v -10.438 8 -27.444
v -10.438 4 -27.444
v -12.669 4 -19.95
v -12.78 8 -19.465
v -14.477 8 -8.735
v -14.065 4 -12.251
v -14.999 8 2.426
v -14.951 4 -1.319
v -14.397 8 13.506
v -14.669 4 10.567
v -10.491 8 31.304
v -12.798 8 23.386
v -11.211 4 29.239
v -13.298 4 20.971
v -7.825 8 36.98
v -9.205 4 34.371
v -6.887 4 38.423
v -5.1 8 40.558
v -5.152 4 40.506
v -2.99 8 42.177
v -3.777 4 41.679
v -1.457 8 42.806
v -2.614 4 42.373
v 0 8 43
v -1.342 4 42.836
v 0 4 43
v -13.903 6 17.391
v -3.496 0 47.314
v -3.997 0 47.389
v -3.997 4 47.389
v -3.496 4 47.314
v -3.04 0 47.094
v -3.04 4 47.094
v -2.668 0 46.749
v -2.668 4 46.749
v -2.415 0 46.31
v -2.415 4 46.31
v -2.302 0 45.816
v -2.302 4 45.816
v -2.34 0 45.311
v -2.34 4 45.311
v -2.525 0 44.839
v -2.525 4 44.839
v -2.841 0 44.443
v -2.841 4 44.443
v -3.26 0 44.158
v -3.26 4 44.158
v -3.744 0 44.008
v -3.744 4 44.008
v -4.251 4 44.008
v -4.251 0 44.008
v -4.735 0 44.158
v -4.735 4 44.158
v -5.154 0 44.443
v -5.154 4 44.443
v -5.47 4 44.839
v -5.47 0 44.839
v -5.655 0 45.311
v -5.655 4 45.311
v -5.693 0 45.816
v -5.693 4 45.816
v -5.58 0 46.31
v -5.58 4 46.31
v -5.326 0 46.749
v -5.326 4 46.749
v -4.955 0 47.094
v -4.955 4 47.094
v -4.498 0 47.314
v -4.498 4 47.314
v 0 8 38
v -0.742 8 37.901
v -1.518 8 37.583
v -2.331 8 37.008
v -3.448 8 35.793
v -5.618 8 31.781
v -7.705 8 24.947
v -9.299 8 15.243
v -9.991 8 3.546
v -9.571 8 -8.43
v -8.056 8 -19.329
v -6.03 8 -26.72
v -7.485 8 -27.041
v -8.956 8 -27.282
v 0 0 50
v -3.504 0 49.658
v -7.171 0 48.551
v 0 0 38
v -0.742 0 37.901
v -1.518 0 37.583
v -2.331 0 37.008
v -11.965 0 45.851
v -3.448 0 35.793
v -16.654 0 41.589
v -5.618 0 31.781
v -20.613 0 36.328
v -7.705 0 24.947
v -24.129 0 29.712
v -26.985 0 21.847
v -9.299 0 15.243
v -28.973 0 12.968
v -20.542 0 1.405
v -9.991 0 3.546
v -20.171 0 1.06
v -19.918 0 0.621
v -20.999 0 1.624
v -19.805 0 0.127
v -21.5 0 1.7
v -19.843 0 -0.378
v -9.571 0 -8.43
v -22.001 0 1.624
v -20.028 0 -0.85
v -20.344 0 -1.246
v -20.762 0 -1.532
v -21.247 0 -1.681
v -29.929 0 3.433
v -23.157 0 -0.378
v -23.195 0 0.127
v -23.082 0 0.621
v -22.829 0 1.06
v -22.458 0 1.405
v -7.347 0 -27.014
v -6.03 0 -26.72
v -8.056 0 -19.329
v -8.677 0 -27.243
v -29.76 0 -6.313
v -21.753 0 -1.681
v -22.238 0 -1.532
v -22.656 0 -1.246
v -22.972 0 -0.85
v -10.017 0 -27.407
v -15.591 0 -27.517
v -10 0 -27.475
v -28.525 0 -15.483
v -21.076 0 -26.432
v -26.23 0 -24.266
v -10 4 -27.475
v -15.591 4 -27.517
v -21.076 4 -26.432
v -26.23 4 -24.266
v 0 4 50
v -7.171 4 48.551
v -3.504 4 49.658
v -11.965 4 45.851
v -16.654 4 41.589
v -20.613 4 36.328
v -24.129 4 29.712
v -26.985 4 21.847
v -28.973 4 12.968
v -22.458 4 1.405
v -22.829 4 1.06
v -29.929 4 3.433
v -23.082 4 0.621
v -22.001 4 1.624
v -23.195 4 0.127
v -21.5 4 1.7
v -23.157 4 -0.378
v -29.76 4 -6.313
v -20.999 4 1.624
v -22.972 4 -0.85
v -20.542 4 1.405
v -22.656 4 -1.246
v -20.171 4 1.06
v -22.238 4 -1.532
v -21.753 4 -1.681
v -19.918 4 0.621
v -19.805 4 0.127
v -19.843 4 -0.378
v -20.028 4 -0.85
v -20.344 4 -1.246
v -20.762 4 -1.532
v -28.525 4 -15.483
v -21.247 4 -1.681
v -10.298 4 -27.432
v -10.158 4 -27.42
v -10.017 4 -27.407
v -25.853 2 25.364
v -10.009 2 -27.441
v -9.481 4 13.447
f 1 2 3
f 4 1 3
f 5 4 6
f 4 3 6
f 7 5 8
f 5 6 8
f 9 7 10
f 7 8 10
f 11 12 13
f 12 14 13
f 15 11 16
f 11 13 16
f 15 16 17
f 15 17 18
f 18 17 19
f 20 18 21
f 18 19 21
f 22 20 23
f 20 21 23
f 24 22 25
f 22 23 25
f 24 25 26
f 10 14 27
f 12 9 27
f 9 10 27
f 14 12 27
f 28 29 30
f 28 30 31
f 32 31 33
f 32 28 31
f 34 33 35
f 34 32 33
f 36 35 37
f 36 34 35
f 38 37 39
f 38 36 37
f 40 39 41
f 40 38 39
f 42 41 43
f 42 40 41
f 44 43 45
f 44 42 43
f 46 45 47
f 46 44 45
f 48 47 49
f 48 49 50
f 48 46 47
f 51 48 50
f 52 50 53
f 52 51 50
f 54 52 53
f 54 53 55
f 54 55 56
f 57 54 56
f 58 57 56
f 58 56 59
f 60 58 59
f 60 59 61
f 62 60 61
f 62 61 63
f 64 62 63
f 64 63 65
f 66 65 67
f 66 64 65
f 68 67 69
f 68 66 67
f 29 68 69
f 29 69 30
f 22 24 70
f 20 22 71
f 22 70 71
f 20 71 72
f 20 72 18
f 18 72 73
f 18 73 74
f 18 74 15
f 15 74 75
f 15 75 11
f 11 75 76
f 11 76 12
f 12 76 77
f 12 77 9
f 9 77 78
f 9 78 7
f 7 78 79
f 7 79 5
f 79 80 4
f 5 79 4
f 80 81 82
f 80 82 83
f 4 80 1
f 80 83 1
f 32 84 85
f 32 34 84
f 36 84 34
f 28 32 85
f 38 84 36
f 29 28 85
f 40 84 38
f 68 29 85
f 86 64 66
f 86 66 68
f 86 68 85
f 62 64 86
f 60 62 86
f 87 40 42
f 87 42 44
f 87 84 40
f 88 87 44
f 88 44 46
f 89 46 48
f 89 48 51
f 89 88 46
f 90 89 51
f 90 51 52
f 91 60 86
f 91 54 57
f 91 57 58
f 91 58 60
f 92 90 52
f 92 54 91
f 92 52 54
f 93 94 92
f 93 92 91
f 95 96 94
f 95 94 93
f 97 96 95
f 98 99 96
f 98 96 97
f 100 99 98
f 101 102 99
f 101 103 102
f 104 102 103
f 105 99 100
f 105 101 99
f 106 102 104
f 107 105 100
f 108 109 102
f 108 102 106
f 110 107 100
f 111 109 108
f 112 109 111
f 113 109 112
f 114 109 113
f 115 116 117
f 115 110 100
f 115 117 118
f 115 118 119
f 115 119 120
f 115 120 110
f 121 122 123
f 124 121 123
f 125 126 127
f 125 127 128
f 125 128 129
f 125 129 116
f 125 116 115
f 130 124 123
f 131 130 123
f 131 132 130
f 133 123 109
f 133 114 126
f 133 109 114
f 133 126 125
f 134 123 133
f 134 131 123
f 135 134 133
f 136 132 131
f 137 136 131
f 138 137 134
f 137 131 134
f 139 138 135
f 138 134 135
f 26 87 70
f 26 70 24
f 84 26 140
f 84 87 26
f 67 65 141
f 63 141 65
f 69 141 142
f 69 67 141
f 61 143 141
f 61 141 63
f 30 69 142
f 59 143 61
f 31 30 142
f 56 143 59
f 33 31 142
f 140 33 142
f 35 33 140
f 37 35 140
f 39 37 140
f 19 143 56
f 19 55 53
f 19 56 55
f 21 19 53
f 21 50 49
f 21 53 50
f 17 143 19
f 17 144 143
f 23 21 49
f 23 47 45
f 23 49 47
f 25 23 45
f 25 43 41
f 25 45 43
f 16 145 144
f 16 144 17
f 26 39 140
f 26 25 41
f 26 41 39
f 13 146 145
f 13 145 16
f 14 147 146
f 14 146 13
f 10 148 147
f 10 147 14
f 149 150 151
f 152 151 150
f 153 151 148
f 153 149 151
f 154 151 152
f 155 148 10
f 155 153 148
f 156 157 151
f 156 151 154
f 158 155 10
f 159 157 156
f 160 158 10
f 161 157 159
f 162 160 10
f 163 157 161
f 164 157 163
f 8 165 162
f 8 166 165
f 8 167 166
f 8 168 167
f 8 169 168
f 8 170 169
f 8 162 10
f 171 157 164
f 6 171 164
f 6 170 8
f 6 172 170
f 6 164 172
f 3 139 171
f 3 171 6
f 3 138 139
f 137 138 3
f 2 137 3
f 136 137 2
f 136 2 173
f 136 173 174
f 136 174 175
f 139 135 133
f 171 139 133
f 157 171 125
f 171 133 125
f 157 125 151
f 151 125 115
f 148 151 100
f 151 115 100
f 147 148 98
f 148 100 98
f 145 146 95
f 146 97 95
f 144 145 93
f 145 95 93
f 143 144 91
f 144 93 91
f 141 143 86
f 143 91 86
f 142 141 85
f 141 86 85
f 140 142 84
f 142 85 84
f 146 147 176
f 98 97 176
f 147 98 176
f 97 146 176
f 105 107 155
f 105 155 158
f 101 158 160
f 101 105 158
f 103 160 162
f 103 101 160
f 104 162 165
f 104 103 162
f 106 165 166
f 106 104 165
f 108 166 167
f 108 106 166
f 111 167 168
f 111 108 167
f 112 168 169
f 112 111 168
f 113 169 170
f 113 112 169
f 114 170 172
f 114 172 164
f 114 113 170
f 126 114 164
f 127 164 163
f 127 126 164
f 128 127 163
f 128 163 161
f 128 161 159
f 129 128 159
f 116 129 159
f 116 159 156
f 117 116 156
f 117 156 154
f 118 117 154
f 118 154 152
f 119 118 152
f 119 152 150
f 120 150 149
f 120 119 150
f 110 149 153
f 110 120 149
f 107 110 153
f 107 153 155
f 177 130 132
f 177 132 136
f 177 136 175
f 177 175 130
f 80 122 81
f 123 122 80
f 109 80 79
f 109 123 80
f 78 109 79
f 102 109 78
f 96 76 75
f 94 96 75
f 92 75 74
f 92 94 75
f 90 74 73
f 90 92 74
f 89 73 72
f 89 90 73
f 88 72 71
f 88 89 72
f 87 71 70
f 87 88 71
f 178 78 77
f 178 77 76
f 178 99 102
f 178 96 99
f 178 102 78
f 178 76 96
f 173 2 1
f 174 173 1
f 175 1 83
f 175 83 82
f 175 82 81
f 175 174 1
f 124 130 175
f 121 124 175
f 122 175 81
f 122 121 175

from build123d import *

# Parameters (mm, degrees)
SKETCH_1_R           = 1.7
EXTRUDE_1_DEPTH      = 4
EXTRUDE_2_DEPTH      = 4
EXTRUDE_2_DEPTH_BACK = 4


with BuildPart() as part:
    # Эскиз1 → Бобышка-Вытянуть1 (new body)
    with BuildSketch(Plane(origin=(0, 0, 0), x_dir=(1, 0, 0), z_dir=(0, 1, 0))):
        with BuildLine():
            Line((0, -50), (0, -43))
            add(Edge.make_bspline(
                [(-10.000145873, 27.475174978), (-27.697978685, -43), (0, -43)],
                knots=[4.019246634, 4.019246634, 4.019246634, 6.283185307, 6.283185307, 6.283185307], degree=2, weights=[1, 0.42487789, 1]))
            ThreePointArc((-10.000145873, 27.475174978), (-18.360814479, 27.113576543), (-26.230013338, 24.266254592))
            add(Edge.make_bspline(
                [(-26.230013338, 24.266254592), (-50.964235719, -50), (0, -50)],
                knots=[4.205654034, 4.205654034, 4.205654034, 6.283185307, 6.283185307, 6.283185307], degree=2, weights=[1, 0.507284392, 1]))
        make_face()
        with Locations((-3.997292475, -45.689262056)):
            Circle(SKETCH_1_R, mode=Mode.SUBTRACT)
        with Locations((-21.5, 0)):
            Circle(SKETCH_1_R, mode=Mode.SUBTRACT)
    extrude(amount=EXTRUDE_1_DEPTH)

    # Эскиз2 → Бобышка-Вытянуть2 (add, two sides: drawn at the far end of the back side and taken through both)
    with BuildSketch(Plane(origin=(0, 4, 0), x_dir=(1, 0, 0), z_dir=(0, 1, 0)).offset(-EXTRUDE_2_DEPTH_BACK)):
        with BuildLine():
            Line((0, -38), (0, -43))
            add(Edge.make_bspline(
                [(-10.438251501, 27.444344811), (-37.035399945, -43), (0, -43)],
                knots=[3.911241966, 3.911241966, 3.911241966, 6.283185307, 6.283185307, 6.283185307], degree=2, weights=[1, 0.375396623, 1]))
            ThreePointArc((-10.438251501, 27.444344811), (-8.2192487, 27.171324469), (-6.029573118, 26.71984426))
            add(Edge.make_bspline(
                [(-6.029573118, 26.71984426), (-29.815932514, -38), (0, -38)],
                knots=[3.788795549, 3.788795549, 3.788795549, 6.283185307, 6.283185307, 6.283185307], degree=2, weights=[1, 0.317983135, 1]))
        make_face()
    extrude(amount=EXTRUDE_2_DEPTH + EXTRUDE_2_DEPTH_BACK)


solid = part.part
